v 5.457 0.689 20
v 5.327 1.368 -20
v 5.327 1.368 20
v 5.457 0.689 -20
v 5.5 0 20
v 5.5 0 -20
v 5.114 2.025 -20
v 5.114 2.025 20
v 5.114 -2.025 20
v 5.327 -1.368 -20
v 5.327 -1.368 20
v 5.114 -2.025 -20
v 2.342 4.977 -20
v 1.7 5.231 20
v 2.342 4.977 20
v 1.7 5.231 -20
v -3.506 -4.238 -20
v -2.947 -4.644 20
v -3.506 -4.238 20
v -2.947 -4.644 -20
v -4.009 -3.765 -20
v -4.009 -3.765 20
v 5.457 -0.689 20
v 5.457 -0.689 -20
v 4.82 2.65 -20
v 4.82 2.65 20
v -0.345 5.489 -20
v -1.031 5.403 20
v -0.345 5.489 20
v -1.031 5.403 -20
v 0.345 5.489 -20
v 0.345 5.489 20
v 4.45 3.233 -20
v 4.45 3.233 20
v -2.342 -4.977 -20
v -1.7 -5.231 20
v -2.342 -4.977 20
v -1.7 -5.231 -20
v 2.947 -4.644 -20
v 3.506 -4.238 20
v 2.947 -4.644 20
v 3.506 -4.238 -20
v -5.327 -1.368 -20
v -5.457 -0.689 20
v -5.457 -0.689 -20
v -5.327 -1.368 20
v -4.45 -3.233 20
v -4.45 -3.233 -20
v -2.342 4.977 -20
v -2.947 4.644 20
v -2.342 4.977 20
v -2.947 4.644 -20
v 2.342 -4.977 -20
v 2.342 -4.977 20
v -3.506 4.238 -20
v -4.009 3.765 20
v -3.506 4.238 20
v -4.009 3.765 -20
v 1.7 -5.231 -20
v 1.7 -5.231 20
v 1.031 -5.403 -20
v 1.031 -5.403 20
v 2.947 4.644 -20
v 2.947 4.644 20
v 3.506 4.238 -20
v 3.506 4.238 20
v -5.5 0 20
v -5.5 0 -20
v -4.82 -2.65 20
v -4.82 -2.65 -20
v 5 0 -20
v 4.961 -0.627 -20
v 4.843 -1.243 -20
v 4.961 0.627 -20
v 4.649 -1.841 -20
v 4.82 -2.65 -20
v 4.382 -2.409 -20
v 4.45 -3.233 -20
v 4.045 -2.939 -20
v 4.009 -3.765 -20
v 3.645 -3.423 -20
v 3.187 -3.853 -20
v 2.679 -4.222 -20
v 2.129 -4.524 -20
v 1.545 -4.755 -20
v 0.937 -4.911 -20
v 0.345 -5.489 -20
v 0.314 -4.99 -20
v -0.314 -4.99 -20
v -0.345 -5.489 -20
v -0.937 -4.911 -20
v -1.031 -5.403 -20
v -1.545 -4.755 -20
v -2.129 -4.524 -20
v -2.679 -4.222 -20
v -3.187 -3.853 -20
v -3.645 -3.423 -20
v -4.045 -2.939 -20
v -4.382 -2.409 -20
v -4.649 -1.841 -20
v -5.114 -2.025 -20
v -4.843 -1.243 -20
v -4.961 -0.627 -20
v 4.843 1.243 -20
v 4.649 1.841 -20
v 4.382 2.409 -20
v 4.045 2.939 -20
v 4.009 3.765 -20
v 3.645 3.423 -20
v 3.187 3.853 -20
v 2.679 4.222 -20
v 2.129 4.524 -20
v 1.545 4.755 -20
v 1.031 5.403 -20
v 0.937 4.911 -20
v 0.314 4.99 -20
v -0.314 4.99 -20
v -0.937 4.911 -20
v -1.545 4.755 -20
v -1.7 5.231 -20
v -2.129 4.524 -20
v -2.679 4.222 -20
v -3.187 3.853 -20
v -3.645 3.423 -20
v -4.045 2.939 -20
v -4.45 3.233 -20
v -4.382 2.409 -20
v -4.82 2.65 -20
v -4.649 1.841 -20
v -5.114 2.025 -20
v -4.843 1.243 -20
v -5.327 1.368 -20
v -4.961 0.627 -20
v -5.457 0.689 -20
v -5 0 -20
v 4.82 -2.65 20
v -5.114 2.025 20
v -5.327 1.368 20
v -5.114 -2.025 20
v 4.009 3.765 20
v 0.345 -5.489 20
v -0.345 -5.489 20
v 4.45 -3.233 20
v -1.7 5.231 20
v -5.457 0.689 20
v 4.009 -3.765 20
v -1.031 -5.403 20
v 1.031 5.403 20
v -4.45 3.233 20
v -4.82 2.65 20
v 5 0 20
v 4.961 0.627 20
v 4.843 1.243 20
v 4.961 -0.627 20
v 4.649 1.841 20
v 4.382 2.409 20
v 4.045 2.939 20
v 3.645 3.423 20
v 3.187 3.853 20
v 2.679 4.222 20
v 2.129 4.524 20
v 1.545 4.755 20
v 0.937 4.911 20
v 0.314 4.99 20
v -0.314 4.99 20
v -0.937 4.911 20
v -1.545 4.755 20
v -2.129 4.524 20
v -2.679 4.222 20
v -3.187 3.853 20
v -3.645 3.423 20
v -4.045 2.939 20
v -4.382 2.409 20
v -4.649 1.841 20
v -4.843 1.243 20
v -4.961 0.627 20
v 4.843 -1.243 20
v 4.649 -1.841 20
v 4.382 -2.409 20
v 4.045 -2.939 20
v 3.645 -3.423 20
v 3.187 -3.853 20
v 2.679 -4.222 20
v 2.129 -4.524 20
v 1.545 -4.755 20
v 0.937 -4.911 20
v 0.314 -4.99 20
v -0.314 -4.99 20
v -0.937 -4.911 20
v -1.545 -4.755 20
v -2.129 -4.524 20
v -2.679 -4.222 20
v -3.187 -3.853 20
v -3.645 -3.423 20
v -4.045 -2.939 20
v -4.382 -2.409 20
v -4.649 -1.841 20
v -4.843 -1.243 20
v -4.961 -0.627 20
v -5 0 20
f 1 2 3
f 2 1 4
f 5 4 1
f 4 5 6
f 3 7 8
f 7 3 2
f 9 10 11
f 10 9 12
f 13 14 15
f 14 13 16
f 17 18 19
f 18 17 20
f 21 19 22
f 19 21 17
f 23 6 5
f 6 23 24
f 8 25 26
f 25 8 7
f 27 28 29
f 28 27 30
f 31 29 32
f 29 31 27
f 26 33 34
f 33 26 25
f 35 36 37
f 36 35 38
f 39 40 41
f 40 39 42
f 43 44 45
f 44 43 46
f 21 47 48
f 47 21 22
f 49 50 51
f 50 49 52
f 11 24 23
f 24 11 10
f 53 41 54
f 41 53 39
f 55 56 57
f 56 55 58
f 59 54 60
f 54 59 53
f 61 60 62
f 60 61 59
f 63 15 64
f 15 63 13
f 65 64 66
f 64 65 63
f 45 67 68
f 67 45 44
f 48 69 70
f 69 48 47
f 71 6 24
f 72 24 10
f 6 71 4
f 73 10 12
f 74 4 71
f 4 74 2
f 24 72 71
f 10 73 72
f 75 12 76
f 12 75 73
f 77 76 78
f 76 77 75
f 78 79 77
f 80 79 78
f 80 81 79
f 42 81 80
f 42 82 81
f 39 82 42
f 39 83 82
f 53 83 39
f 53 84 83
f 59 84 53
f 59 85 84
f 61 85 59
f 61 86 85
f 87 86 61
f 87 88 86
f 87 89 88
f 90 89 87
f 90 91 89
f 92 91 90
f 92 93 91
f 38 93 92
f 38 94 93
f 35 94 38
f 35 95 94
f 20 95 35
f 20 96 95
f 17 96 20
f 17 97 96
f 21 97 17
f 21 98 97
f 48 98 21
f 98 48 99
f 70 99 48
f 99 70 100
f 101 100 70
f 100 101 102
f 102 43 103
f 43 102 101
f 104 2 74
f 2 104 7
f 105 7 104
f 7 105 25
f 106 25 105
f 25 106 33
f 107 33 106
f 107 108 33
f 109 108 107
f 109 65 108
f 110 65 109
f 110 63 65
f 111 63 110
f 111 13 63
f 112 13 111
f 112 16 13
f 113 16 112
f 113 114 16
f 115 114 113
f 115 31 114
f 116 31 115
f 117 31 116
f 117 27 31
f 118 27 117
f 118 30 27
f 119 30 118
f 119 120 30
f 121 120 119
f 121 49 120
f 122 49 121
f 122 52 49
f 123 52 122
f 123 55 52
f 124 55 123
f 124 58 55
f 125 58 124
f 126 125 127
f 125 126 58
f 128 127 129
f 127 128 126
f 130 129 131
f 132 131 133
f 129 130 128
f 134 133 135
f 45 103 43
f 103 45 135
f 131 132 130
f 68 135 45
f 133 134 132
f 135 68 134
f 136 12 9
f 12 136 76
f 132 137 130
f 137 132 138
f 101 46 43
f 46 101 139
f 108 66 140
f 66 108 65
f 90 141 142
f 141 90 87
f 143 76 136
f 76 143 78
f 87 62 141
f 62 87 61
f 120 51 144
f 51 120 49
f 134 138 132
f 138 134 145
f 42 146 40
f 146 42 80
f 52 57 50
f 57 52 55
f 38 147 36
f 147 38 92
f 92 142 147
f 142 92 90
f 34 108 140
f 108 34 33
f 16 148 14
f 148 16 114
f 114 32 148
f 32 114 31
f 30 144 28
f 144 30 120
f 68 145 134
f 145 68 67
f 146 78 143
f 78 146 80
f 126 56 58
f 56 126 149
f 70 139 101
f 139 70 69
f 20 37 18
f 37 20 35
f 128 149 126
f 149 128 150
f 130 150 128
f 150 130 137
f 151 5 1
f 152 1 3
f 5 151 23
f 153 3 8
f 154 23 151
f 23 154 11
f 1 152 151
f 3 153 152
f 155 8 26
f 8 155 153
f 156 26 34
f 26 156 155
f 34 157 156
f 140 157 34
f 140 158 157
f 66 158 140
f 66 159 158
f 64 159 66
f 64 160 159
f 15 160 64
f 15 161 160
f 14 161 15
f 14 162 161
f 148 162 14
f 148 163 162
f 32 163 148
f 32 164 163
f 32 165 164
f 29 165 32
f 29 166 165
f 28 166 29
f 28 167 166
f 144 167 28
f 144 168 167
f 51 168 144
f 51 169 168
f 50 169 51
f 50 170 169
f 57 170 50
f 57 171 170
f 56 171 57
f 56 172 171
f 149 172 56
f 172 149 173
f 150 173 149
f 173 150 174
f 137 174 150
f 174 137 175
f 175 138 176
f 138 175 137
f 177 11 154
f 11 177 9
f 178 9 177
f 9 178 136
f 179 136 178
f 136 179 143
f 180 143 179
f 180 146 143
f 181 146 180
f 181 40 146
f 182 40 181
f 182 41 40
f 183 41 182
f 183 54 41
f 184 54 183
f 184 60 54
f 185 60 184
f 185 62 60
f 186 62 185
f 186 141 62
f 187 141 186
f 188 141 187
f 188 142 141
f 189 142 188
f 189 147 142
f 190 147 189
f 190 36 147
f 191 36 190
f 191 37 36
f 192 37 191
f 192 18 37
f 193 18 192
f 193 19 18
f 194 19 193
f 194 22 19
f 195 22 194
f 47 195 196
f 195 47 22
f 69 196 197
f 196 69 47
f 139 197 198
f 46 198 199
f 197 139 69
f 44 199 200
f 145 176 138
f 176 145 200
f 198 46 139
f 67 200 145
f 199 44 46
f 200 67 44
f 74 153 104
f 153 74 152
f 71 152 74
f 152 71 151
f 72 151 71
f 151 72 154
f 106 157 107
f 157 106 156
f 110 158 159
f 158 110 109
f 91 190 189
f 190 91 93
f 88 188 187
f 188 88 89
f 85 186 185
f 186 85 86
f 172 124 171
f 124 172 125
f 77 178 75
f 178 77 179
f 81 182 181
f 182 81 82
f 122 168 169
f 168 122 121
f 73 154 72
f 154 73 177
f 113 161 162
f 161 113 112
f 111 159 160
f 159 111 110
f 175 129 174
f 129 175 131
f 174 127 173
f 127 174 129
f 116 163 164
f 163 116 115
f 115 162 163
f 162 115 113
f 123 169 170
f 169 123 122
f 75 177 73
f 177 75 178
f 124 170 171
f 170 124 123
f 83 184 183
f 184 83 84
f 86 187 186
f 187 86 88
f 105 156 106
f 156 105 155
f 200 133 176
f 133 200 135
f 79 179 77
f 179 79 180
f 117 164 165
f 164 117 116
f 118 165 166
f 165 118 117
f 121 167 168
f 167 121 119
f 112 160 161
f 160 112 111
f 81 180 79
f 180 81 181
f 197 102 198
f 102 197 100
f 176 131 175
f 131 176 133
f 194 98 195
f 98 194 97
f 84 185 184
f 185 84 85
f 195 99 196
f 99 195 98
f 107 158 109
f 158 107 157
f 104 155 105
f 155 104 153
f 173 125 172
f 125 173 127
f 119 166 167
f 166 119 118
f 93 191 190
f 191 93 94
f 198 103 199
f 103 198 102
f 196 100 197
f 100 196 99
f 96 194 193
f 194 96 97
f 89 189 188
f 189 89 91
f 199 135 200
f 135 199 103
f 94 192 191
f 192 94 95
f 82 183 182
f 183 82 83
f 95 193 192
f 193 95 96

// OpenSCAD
$fn = 50;


difference() {
	union() {
		translate(v = [0, 0, -20.0000000000]) {
			cylinder(h = 40, r = 5.5000000000);
		}
	}
	union() {
		translate(v = [0, 0, -100.0000000000]) {
			cylinder(h = 200, r = 5.0000000000);
		}
	}
}
